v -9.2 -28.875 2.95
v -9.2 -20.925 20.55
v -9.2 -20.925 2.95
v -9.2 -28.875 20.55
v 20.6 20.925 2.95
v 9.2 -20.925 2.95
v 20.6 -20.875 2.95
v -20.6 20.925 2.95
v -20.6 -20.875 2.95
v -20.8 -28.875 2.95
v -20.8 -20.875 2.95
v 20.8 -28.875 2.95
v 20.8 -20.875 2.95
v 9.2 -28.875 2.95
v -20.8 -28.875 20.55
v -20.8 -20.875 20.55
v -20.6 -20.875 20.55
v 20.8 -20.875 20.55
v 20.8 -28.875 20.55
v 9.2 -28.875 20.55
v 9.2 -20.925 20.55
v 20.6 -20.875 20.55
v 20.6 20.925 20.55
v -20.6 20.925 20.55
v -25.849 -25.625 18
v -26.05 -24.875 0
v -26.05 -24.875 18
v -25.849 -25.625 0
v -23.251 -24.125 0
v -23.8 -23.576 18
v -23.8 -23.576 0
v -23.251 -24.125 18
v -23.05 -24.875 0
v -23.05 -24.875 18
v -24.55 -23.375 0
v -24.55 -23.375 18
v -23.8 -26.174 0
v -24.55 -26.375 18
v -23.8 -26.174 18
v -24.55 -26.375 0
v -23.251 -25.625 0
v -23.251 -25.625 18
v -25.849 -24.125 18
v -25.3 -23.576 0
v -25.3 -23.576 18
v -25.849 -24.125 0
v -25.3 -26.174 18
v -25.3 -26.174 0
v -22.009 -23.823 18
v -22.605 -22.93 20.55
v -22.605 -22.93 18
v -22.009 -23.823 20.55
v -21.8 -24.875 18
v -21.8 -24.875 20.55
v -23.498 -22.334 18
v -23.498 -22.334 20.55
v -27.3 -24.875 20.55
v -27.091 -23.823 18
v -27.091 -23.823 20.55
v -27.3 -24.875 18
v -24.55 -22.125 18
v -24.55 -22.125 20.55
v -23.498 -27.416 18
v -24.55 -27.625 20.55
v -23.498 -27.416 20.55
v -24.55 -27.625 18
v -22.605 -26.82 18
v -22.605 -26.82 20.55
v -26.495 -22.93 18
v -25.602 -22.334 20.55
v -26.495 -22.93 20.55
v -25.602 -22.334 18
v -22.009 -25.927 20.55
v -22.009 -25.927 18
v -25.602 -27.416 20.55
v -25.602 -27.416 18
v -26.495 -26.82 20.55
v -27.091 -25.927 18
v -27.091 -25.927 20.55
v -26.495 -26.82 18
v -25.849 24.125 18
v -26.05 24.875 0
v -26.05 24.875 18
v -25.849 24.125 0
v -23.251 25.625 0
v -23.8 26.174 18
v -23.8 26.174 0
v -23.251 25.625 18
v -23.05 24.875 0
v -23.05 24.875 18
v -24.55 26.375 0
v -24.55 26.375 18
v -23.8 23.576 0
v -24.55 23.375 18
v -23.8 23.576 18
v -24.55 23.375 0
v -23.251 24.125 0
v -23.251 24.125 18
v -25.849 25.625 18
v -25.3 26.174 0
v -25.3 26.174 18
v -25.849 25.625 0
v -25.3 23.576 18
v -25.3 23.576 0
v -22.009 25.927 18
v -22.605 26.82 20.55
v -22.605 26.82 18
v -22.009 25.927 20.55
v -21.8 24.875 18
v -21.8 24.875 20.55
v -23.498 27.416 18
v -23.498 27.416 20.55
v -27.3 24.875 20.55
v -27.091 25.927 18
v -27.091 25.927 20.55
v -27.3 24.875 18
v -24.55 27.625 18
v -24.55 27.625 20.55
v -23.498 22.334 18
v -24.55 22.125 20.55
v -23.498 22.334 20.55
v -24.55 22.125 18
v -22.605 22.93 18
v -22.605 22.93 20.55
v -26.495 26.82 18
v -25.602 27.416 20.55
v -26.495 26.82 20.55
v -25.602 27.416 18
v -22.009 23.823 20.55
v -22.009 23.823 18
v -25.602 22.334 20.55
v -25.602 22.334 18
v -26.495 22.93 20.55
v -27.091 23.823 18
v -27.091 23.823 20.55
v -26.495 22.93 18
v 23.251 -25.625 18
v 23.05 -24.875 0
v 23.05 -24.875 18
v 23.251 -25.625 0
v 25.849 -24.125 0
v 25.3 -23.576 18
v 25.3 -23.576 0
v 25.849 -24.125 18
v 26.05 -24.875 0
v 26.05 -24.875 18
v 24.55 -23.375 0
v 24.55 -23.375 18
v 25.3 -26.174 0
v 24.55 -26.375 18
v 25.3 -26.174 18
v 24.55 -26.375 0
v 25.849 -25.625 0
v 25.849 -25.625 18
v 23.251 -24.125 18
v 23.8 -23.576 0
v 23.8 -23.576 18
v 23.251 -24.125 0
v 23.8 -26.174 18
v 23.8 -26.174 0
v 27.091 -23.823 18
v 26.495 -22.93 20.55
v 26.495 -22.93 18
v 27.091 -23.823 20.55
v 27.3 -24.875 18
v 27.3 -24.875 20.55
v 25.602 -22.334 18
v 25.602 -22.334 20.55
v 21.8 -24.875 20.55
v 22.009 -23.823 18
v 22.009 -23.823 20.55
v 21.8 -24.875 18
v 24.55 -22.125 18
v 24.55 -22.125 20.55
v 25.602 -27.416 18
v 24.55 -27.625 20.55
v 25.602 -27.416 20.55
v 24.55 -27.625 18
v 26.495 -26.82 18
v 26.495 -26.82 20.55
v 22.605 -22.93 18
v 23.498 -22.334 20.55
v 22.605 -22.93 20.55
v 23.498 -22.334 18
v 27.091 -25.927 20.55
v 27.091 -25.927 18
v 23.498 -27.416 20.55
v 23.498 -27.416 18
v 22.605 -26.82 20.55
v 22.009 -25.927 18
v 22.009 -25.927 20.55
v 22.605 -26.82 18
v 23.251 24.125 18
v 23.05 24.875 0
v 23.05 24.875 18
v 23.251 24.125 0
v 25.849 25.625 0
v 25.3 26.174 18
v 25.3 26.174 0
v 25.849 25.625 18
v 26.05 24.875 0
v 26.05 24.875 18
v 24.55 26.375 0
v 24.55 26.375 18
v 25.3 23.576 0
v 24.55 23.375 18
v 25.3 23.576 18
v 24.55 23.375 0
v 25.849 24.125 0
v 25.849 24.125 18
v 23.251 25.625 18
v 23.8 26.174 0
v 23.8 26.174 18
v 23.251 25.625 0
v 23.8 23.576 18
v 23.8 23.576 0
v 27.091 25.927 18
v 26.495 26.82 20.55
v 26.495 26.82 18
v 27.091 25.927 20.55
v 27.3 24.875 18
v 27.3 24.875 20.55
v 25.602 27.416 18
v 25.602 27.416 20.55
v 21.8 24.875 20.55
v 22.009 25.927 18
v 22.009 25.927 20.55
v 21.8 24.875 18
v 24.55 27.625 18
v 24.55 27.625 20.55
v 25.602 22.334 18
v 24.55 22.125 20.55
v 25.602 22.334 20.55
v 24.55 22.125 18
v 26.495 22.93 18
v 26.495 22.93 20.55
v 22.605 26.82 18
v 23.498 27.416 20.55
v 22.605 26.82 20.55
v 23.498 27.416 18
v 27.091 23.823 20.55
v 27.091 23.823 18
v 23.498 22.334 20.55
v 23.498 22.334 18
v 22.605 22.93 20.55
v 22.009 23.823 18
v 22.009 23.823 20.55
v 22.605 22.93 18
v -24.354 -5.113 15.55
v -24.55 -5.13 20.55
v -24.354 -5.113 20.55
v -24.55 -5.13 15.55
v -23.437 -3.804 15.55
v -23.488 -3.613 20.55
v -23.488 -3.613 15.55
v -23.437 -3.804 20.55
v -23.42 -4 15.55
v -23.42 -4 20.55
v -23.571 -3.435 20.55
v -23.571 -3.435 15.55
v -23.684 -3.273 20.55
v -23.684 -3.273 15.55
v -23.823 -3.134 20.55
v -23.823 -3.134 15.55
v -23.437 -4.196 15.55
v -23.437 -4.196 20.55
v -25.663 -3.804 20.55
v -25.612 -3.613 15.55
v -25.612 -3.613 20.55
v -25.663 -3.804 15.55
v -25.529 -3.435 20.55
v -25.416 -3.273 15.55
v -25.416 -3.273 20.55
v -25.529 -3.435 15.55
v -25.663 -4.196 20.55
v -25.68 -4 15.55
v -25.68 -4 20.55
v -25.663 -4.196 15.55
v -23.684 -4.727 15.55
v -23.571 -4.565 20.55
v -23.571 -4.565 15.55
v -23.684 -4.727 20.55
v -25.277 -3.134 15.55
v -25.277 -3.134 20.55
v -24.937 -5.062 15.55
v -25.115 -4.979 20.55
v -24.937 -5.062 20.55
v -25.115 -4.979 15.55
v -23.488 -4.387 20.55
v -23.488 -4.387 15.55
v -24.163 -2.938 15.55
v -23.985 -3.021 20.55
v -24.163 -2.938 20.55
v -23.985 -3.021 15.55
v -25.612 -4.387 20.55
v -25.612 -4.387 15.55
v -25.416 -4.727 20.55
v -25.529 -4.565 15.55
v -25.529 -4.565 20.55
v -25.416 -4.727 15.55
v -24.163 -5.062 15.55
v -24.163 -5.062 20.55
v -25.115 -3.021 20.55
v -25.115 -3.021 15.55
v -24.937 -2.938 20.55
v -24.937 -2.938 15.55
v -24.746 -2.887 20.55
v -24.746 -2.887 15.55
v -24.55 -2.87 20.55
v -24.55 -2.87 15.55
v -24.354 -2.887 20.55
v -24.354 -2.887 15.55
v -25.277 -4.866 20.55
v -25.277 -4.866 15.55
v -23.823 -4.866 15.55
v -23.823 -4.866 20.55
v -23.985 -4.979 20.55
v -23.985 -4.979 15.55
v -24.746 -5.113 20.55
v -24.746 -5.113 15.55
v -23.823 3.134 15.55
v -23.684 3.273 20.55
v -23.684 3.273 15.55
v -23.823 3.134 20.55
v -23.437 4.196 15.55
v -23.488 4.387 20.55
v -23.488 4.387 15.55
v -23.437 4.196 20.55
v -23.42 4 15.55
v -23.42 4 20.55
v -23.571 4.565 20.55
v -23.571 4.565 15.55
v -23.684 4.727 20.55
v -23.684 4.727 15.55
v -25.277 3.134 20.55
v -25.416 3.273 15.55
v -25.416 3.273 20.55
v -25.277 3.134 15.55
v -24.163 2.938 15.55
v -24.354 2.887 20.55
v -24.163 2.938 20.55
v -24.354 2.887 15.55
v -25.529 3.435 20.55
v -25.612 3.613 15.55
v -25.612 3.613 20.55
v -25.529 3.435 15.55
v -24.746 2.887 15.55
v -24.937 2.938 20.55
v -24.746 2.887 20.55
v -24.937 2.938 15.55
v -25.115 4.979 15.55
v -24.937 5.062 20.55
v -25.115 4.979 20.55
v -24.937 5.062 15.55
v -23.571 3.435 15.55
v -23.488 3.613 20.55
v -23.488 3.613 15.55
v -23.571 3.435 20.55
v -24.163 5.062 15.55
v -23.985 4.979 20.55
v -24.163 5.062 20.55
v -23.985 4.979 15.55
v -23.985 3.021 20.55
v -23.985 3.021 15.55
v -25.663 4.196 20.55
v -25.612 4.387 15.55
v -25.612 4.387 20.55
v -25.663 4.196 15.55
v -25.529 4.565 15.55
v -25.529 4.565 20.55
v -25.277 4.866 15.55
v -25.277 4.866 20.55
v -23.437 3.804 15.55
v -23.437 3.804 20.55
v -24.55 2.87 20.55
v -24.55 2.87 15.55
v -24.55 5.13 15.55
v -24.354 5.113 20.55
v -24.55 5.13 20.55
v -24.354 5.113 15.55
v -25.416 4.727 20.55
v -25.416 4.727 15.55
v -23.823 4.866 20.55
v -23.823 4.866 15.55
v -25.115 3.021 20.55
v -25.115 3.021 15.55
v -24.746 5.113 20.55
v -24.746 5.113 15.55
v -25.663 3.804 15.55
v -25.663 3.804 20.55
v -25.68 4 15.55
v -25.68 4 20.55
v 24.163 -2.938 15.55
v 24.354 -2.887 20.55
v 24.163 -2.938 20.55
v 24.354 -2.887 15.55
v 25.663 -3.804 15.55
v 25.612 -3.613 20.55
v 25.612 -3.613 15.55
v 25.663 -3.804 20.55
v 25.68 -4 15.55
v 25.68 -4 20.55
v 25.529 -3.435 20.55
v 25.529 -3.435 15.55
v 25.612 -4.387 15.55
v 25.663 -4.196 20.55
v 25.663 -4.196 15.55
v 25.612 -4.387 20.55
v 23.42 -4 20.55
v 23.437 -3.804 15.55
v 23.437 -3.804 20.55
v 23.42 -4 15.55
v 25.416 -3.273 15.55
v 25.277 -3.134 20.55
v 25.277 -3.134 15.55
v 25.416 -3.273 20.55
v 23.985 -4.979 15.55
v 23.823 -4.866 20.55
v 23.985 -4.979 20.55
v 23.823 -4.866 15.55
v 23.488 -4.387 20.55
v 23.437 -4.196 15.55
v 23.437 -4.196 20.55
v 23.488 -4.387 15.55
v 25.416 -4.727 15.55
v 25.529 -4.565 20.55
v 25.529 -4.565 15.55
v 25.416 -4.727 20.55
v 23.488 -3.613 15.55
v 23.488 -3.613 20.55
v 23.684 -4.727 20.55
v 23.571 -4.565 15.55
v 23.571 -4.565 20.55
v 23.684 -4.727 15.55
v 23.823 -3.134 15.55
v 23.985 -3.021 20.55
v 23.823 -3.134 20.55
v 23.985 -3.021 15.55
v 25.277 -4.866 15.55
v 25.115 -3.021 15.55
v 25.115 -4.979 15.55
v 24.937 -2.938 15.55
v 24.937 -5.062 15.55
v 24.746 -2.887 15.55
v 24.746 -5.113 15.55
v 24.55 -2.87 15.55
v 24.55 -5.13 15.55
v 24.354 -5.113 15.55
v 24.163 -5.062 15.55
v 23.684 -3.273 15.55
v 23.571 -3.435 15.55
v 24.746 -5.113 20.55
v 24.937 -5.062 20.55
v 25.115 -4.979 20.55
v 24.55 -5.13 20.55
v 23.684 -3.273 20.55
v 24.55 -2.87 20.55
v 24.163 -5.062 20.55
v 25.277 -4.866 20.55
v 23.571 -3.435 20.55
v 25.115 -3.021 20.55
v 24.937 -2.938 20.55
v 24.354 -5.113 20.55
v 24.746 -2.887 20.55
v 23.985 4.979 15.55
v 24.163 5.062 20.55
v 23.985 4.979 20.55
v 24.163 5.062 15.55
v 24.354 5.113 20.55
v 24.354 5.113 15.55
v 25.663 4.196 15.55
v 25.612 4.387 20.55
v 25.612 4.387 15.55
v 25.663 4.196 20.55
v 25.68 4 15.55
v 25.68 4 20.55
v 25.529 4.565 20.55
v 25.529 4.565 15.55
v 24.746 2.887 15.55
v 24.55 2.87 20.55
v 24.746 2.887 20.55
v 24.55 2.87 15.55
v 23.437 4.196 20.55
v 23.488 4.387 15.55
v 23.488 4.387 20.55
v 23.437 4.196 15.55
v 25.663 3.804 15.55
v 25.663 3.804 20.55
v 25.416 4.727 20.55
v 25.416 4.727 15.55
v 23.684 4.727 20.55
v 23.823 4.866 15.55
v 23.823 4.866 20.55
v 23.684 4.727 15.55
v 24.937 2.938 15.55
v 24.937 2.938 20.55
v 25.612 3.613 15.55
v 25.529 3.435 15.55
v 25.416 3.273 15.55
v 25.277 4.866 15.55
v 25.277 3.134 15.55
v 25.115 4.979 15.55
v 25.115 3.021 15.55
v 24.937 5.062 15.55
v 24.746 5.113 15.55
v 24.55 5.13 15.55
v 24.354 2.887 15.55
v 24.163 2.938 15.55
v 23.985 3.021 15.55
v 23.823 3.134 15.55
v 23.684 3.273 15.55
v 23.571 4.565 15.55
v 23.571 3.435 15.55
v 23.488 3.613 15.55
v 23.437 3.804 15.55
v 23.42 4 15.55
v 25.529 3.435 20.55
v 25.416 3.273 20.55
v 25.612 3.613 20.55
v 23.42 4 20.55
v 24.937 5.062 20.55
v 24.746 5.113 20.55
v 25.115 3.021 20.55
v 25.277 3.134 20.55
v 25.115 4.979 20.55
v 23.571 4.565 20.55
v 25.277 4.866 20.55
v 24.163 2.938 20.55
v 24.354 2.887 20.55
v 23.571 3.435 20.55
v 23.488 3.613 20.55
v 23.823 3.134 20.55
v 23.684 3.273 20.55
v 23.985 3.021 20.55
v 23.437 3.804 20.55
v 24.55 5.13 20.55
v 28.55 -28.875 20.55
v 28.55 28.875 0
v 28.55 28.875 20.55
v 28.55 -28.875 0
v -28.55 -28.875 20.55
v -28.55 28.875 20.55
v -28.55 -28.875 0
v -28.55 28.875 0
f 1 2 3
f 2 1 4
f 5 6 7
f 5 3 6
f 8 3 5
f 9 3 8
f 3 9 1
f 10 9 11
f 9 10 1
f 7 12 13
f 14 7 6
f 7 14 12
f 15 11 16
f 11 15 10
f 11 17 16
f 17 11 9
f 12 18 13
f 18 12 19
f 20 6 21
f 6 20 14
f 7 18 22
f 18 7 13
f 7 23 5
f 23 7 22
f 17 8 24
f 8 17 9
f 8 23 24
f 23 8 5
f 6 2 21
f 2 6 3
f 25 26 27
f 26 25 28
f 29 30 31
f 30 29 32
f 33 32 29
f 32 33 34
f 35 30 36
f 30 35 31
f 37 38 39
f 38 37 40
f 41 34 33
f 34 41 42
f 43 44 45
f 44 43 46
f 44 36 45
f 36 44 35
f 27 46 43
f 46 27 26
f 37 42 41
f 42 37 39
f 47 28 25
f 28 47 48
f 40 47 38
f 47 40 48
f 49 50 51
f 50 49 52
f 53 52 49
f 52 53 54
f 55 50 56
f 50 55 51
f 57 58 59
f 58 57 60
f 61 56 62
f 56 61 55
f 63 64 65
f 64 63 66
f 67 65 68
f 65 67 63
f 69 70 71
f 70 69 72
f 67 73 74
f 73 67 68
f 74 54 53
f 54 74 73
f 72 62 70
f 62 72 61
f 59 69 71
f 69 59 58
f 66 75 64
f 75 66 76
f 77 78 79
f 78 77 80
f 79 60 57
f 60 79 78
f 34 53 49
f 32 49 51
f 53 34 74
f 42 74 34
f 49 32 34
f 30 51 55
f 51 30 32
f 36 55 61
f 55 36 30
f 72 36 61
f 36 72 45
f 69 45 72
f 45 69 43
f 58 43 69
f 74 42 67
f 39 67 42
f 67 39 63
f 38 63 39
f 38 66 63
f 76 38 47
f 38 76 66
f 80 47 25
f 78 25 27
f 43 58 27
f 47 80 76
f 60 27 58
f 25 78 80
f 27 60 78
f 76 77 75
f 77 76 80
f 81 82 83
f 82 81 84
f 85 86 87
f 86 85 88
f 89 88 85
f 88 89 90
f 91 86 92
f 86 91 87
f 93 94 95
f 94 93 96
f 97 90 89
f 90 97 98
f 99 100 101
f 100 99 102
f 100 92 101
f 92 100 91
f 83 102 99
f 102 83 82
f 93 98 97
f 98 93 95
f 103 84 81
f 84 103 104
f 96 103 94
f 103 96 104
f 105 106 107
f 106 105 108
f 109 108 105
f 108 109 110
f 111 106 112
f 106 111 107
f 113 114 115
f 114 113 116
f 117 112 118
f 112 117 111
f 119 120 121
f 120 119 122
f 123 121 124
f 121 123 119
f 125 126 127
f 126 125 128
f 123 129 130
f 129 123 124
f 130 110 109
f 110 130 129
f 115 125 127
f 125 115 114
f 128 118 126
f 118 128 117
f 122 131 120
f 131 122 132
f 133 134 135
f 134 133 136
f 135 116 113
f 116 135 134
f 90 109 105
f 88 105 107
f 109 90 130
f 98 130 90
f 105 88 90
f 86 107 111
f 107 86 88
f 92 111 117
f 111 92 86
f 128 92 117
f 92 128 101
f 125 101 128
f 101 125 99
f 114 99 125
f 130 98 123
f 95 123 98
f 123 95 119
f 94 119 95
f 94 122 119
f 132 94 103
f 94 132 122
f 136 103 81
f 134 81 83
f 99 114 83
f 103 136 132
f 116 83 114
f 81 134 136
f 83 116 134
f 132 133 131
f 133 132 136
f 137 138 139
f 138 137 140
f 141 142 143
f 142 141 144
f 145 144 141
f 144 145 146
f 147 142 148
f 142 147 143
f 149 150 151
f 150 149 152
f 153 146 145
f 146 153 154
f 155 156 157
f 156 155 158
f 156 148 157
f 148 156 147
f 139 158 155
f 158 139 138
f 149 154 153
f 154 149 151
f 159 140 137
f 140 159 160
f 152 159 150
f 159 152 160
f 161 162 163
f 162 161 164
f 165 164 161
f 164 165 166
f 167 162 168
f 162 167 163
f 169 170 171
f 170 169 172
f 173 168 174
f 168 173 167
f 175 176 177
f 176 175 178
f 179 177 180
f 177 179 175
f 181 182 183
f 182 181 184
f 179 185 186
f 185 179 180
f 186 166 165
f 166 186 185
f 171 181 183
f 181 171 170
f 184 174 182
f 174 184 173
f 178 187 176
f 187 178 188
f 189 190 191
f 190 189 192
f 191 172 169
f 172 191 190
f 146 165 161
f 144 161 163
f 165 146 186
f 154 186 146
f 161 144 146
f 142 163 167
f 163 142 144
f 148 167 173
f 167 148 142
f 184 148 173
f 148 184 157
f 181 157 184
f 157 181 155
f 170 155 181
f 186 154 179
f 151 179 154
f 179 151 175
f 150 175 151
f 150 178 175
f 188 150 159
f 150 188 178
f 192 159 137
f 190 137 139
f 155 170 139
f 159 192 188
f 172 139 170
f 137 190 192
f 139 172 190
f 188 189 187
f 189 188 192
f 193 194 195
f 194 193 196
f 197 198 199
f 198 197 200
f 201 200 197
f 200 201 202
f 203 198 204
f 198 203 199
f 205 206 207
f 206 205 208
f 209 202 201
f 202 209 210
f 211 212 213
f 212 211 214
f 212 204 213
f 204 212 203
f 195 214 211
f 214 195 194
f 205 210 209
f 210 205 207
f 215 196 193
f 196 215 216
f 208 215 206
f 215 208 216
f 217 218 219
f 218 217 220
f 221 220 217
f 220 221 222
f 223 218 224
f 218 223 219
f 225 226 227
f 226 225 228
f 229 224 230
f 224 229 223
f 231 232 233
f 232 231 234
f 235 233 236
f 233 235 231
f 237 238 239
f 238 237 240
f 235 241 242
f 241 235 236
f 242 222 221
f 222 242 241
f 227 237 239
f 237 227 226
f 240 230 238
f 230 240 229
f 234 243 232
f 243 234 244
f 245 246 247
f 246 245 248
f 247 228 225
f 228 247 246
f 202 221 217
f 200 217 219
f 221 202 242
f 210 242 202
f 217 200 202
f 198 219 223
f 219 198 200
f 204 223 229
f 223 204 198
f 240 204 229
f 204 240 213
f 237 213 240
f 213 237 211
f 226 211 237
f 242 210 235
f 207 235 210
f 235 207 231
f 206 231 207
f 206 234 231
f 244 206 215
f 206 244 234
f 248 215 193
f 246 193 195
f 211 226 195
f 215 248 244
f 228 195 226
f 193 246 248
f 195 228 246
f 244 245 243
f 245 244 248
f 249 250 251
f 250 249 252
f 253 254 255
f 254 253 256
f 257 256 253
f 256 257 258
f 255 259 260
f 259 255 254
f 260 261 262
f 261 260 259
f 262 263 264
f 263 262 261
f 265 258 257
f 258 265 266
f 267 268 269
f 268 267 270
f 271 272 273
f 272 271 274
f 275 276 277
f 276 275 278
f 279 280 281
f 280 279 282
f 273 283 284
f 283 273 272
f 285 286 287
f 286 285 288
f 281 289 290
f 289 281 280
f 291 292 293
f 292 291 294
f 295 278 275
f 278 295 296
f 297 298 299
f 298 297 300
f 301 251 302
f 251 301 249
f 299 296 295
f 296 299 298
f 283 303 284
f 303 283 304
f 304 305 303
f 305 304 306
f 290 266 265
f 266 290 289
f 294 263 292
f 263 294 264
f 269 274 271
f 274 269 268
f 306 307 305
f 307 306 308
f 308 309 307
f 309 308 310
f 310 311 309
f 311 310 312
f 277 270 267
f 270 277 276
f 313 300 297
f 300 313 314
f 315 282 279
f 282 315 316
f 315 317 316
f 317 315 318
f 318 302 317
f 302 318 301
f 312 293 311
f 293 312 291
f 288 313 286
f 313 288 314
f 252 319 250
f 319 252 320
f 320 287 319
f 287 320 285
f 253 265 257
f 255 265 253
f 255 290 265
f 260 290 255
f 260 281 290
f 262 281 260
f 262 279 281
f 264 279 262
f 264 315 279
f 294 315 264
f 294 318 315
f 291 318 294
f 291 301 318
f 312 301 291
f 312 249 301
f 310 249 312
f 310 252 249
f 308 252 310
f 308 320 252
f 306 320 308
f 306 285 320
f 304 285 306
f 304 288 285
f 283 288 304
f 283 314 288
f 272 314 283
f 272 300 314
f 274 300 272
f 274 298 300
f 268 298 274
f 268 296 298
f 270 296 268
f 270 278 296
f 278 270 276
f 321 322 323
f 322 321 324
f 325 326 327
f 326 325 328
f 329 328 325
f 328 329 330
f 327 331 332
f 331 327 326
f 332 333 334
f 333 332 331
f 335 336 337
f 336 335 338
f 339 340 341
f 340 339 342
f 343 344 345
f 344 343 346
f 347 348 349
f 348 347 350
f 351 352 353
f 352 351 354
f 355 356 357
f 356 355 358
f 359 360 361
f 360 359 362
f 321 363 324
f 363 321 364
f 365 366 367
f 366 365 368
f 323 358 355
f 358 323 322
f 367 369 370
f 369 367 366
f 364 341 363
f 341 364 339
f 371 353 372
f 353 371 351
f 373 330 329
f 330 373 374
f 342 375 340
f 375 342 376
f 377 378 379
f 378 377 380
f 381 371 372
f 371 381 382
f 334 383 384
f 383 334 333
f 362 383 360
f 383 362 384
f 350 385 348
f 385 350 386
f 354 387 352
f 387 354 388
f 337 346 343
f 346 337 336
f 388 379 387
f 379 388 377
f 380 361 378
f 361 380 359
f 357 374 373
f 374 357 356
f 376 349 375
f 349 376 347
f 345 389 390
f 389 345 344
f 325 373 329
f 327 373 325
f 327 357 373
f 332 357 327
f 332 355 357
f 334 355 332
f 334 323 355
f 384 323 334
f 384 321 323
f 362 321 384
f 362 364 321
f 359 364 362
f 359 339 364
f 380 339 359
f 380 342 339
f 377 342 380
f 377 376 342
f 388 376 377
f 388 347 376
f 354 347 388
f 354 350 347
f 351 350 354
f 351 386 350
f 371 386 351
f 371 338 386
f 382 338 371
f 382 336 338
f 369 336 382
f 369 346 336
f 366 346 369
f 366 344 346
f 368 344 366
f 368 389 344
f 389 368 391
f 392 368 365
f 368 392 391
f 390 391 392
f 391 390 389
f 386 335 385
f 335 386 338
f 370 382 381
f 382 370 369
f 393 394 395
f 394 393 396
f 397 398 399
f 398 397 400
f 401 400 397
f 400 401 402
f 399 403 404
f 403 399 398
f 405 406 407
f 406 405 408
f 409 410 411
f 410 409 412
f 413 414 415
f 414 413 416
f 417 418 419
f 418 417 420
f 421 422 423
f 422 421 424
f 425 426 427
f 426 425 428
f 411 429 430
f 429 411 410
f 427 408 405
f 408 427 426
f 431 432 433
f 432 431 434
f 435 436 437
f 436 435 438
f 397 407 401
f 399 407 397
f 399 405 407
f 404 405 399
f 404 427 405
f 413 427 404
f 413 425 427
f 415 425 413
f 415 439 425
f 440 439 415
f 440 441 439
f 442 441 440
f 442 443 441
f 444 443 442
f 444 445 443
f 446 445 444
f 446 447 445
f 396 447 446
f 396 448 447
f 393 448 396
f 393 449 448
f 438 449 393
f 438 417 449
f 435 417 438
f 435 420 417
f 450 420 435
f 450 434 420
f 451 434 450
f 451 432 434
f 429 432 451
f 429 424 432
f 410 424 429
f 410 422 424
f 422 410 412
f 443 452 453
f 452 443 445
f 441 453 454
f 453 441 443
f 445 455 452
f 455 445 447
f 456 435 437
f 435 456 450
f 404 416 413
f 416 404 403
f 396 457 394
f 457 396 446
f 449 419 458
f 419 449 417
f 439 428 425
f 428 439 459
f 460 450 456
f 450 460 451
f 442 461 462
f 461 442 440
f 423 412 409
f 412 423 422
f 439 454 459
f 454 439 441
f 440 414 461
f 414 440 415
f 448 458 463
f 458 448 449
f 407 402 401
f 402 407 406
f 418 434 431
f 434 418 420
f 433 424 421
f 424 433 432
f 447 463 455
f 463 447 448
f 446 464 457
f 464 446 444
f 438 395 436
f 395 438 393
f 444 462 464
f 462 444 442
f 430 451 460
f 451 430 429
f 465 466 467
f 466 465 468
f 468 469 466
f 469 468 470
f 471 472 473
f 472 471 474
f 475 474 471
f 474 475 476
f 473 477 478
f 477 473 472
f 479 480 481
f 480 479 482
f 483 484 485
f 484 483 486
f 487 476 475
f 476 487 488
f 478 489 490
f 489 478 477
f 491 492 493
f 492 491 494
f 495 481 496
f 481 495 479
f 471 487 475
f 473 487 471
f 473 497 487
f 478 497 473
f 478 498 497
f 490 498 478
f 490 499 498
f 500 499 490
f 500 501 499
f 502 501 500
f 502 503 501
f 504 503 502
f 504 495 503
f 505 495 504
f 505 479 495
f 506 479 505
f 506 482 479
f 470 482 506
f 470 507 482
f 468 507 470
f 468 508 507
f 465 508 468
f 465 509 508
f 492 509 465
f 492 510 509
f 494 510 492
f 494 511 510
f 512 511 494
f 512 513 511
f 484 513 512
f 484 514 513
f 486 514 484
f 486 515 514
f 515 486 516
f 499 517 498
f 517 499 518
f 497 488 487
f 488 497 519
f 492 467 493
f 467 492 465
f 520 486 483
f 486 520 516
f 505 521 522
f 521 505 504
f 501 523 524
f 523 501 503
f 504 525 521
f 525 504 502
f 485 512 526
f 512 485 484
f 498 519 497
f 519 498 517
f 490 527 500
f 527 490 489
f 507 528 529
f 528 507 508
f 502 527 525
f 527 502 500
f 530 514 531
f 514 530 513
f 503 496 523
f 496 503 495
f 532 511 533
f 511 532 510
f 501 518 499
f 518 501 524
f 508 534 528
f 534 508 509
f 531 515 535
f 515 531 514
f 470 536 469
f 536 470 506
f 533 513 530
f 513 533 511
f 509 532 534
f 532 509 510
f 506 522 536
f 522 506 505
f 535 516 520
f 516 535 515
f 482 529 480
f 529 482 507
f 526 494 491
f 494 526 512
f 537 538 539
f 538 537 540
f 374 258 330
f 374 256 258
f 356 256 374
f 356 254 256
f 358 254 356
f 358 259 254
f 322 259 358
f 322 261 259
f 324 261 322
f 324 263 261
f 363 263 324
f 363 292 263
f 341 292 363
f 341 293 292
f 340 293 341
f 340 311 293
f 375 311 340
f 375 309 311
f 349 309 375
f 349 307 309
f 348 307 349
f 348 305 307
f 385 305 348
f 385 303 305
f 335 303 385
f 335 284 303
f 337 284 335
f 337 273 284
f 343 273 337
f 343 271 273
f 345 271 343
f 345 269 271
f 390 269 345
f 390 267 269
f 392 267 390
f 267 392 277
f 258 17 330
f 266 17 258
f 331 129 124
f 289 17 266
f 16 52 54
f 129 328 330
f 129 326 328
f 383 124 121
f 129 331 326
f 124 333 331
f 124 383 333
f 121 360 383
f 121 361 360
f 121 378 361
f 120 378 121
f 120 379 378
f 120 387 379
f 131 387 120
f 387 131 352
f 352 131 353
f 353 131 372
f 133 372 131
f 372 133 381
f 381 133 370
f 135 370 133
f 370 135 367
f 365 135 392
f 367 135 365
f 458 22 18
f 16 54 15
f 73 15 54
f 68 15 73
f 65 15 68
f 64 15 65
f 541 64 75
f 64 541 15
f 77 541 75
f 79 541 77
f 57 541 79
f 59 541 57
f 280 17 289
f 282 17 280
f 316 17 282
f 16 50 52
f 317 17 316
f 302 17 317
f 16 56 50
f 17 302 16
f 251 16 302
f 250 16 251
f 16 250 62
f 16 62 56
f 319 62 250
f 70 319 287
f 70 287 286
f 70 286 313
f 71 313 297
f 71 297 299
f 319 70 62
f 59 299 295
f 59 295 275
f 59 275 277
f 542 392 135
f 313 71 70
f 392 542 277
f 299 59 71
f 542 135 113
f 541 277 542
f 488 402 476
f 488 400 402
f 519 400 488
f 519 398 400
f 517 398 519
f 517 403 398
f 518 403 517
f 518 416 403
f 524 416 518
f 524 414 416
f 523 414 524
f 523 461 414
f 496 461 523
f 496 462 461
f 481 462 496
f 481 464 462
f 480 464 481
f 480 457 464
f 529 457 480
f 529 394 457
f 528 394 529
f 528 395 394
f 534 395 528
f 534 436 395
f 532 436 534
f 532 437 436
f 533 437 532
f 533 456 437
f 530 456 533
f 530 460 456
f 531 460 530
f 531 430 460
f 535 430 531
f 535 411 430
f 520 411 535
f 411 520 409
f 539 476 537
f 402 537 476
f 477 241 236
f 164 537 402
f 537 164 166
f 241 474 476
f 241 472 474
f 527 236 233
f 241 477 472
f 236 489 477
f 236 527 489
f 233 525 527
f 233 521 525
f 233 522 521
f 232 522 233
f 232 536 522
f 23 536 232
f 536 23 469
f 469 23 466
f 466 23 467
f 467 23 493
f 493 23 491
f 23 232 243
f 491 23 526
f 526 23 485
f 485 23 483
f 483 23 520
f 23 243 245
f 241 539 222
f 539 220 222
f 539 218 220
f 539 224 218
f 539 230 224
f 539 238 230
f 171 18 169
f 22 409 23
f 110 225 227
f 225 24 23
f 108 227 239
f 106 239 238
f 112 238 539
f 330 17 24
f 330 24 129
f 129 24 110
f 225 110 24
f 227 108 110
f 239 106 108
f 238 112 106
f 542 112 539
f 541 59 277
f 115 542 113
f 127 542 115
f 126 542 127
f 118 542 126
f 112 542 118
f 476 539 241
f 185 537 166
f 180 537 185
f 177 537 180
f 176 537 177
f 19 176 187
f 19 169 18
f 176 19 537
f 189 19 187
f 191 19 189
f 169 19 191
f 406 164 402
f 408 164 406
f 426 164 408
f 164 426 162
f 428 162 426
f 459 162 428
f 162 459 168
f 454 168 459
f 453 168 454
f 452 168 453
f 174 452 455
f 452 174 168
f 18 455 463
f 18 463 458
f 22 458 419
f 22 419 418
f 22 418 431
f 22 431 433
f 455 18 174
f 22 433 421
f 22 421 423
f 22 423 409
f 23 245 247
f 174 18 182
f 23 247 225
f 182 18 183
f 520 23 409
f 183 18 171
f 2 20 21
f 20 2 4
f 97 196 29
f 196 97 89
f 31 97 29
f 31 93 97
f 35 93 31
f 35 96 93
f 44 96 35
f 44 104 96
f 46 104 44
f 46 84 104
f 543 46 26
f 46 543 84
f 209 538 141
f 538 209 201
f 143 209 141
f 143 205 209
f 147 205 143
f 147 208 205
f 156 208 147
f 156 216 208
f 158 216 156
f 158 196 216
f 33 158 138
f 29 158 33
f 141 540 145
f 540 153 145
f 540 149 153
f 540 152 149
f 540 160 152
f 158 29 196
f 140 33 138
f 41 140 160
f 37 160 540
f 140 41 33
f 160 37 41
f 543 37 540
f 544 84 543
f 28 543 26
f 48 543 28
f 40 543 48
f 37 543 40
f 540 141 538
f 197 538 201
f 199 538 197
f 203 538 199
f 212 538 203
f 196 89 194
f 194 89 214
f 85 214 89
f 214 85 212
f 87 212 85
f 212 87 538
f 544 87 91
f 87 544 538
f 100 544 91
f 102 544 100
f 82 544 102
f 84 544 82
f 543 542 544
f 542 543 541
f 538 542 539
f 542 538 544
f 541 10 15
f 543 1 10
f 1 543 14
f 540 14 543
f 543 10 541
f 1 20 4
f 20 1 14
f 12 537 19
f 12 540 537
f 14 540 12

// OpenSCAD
// file: waterblock.scad
// TODO: height needs to be measured
// TODO: barb dimensions!

module waterblock() {
  color("blue")
  union () {
    cube(size=[41.1, 41.75, 12.25], center=true);
    
    for (x=[-1,1]) {
      translate([x * (41.5 - 11.5) / 2, -25, 0])
        rotate([90, 0, 0])
          cylinder(r=11.5/2, h=12, center=true);
    }
  }
}
// main file
use <waterblock.scad>

wb_w = 41.1;
wb_d = 41.75;
wb_h = 12.25;
wb_inlet_d = (41.5 - 11.5);
wb_inlet_r = 11.5/2;

margin = 8;

tec_h = 3.3;
tec_w = 40;
tec_d = 40;

t = 6;

mounting_screw_d = 3;
mounting_screw_head_d = 5.5; // TODO: measure
mounting_screw_head_t = 2.5; // TODO: measure

components_depth = wb_h + tec_h + 2;
carriage_depth = 3 + components_depth;
echo("carriage depth", carriage_depth);

clamp_drill_d = .0890 * 25.4;

// TODO: rounded corners on main shape
module base() {
  translate([0, 0, carriage_depth/2])
  difference() {
    cube(size=[wb_w + 2 * margin, wb_d + 2 * margin, carriage_depth], center=true);

    translate([0, 0, carriage_depth/2 - components_depth/2]) {
      cube(size=[wb_w + 0.1, wb_d + 0.1, components_depth+0.1], center=true);
      for (x=[-1,1]) {
        translate([x * wb_inlet_d / 2, -(wb_d + 2 * margin) / 2, 0])
          cube(size=[wb_inlet_r * 2 + 0.1, margin*2, components_depth+0.1], center=true);
      }
    }

    for (x=[-1,1], y=[-1,1]) {
      translate([x * (wb_w / 2 + margin / 2), y * (wb_d / 2 + margin / 2), 0]) {
        cylinder(r=mounting_screw_d/2, h=2*carriage_depth, center=true, $fn=12);

        translate([0, 0, carriage_depth/2 - mounting_screw_head_t/2])
          cylinder(r=mounting_screw_head_d/2, h=mounting_screw_head_t+0.1, center=true, $fn=16);
      }
    }

    for (x=[-1,1], y=[-1,1]) {
      translate([x * (wb_w + margin) / 2, y * 4, carriage_depth/2]) 
        cylinder(r=clamp_drill_d/2, h=10, center=true, $fn=36);
    }
  }
}

module clamp() {
  color("pink") 
  translate([0, 0, 6/2]) {
    translate([0, 14, 0]) 
      cube(size=[wb_w + margin*2, 4, 6], center=true);
    translate([0, -15.5, 0]) 
      cube(size=[wb_w + margin*2, 4, 6], center=true);

    for (x=[-1,1]) {
      translate([x * (wb_w + margin) / 2, 0, 0]) {
        difference() {
          cube(size=[margin, wb_d, 6], center=true);
          hull() {
            for (y=[-1,1]) {
              translate([0, y * 6, 0])
                cylinder(r=1.5, h=10, center=true, $fn=12);
            }
          }
        }
      }
    }
  }
}

module tec() {
  color("white")
    cube(size=[40, 40, tec_h], center=true);
}

module heatsink() {
  color("gray") {
    translate([0, 0, 2.5/2])
      cube(size=[40, 40, 2.5], center=true);

    translate([40/2 - 3/2, 0, 30/2]) cube(size=[3, 40, 30], center=true);

    for (x=[0:4]) {
      translate([-40/2 + 1.8/2 + x * (5.5 + 1.8), 0, 30/2]) cube(size=[1.8, 40, 30], center=true);
    }
  }
}

!base();

translate([0, 0, carriage_depth]) 
  clamp();


translate([0, 0, t/2 + wb_h/2])
  waterblock();

translate([0, 0, t/2 + wb_h + tec_h/2])
  tec();

translate([0, 0, t/2 + wb_h + tec_h])
  rotate([0, 0, 90]) heatsink();
